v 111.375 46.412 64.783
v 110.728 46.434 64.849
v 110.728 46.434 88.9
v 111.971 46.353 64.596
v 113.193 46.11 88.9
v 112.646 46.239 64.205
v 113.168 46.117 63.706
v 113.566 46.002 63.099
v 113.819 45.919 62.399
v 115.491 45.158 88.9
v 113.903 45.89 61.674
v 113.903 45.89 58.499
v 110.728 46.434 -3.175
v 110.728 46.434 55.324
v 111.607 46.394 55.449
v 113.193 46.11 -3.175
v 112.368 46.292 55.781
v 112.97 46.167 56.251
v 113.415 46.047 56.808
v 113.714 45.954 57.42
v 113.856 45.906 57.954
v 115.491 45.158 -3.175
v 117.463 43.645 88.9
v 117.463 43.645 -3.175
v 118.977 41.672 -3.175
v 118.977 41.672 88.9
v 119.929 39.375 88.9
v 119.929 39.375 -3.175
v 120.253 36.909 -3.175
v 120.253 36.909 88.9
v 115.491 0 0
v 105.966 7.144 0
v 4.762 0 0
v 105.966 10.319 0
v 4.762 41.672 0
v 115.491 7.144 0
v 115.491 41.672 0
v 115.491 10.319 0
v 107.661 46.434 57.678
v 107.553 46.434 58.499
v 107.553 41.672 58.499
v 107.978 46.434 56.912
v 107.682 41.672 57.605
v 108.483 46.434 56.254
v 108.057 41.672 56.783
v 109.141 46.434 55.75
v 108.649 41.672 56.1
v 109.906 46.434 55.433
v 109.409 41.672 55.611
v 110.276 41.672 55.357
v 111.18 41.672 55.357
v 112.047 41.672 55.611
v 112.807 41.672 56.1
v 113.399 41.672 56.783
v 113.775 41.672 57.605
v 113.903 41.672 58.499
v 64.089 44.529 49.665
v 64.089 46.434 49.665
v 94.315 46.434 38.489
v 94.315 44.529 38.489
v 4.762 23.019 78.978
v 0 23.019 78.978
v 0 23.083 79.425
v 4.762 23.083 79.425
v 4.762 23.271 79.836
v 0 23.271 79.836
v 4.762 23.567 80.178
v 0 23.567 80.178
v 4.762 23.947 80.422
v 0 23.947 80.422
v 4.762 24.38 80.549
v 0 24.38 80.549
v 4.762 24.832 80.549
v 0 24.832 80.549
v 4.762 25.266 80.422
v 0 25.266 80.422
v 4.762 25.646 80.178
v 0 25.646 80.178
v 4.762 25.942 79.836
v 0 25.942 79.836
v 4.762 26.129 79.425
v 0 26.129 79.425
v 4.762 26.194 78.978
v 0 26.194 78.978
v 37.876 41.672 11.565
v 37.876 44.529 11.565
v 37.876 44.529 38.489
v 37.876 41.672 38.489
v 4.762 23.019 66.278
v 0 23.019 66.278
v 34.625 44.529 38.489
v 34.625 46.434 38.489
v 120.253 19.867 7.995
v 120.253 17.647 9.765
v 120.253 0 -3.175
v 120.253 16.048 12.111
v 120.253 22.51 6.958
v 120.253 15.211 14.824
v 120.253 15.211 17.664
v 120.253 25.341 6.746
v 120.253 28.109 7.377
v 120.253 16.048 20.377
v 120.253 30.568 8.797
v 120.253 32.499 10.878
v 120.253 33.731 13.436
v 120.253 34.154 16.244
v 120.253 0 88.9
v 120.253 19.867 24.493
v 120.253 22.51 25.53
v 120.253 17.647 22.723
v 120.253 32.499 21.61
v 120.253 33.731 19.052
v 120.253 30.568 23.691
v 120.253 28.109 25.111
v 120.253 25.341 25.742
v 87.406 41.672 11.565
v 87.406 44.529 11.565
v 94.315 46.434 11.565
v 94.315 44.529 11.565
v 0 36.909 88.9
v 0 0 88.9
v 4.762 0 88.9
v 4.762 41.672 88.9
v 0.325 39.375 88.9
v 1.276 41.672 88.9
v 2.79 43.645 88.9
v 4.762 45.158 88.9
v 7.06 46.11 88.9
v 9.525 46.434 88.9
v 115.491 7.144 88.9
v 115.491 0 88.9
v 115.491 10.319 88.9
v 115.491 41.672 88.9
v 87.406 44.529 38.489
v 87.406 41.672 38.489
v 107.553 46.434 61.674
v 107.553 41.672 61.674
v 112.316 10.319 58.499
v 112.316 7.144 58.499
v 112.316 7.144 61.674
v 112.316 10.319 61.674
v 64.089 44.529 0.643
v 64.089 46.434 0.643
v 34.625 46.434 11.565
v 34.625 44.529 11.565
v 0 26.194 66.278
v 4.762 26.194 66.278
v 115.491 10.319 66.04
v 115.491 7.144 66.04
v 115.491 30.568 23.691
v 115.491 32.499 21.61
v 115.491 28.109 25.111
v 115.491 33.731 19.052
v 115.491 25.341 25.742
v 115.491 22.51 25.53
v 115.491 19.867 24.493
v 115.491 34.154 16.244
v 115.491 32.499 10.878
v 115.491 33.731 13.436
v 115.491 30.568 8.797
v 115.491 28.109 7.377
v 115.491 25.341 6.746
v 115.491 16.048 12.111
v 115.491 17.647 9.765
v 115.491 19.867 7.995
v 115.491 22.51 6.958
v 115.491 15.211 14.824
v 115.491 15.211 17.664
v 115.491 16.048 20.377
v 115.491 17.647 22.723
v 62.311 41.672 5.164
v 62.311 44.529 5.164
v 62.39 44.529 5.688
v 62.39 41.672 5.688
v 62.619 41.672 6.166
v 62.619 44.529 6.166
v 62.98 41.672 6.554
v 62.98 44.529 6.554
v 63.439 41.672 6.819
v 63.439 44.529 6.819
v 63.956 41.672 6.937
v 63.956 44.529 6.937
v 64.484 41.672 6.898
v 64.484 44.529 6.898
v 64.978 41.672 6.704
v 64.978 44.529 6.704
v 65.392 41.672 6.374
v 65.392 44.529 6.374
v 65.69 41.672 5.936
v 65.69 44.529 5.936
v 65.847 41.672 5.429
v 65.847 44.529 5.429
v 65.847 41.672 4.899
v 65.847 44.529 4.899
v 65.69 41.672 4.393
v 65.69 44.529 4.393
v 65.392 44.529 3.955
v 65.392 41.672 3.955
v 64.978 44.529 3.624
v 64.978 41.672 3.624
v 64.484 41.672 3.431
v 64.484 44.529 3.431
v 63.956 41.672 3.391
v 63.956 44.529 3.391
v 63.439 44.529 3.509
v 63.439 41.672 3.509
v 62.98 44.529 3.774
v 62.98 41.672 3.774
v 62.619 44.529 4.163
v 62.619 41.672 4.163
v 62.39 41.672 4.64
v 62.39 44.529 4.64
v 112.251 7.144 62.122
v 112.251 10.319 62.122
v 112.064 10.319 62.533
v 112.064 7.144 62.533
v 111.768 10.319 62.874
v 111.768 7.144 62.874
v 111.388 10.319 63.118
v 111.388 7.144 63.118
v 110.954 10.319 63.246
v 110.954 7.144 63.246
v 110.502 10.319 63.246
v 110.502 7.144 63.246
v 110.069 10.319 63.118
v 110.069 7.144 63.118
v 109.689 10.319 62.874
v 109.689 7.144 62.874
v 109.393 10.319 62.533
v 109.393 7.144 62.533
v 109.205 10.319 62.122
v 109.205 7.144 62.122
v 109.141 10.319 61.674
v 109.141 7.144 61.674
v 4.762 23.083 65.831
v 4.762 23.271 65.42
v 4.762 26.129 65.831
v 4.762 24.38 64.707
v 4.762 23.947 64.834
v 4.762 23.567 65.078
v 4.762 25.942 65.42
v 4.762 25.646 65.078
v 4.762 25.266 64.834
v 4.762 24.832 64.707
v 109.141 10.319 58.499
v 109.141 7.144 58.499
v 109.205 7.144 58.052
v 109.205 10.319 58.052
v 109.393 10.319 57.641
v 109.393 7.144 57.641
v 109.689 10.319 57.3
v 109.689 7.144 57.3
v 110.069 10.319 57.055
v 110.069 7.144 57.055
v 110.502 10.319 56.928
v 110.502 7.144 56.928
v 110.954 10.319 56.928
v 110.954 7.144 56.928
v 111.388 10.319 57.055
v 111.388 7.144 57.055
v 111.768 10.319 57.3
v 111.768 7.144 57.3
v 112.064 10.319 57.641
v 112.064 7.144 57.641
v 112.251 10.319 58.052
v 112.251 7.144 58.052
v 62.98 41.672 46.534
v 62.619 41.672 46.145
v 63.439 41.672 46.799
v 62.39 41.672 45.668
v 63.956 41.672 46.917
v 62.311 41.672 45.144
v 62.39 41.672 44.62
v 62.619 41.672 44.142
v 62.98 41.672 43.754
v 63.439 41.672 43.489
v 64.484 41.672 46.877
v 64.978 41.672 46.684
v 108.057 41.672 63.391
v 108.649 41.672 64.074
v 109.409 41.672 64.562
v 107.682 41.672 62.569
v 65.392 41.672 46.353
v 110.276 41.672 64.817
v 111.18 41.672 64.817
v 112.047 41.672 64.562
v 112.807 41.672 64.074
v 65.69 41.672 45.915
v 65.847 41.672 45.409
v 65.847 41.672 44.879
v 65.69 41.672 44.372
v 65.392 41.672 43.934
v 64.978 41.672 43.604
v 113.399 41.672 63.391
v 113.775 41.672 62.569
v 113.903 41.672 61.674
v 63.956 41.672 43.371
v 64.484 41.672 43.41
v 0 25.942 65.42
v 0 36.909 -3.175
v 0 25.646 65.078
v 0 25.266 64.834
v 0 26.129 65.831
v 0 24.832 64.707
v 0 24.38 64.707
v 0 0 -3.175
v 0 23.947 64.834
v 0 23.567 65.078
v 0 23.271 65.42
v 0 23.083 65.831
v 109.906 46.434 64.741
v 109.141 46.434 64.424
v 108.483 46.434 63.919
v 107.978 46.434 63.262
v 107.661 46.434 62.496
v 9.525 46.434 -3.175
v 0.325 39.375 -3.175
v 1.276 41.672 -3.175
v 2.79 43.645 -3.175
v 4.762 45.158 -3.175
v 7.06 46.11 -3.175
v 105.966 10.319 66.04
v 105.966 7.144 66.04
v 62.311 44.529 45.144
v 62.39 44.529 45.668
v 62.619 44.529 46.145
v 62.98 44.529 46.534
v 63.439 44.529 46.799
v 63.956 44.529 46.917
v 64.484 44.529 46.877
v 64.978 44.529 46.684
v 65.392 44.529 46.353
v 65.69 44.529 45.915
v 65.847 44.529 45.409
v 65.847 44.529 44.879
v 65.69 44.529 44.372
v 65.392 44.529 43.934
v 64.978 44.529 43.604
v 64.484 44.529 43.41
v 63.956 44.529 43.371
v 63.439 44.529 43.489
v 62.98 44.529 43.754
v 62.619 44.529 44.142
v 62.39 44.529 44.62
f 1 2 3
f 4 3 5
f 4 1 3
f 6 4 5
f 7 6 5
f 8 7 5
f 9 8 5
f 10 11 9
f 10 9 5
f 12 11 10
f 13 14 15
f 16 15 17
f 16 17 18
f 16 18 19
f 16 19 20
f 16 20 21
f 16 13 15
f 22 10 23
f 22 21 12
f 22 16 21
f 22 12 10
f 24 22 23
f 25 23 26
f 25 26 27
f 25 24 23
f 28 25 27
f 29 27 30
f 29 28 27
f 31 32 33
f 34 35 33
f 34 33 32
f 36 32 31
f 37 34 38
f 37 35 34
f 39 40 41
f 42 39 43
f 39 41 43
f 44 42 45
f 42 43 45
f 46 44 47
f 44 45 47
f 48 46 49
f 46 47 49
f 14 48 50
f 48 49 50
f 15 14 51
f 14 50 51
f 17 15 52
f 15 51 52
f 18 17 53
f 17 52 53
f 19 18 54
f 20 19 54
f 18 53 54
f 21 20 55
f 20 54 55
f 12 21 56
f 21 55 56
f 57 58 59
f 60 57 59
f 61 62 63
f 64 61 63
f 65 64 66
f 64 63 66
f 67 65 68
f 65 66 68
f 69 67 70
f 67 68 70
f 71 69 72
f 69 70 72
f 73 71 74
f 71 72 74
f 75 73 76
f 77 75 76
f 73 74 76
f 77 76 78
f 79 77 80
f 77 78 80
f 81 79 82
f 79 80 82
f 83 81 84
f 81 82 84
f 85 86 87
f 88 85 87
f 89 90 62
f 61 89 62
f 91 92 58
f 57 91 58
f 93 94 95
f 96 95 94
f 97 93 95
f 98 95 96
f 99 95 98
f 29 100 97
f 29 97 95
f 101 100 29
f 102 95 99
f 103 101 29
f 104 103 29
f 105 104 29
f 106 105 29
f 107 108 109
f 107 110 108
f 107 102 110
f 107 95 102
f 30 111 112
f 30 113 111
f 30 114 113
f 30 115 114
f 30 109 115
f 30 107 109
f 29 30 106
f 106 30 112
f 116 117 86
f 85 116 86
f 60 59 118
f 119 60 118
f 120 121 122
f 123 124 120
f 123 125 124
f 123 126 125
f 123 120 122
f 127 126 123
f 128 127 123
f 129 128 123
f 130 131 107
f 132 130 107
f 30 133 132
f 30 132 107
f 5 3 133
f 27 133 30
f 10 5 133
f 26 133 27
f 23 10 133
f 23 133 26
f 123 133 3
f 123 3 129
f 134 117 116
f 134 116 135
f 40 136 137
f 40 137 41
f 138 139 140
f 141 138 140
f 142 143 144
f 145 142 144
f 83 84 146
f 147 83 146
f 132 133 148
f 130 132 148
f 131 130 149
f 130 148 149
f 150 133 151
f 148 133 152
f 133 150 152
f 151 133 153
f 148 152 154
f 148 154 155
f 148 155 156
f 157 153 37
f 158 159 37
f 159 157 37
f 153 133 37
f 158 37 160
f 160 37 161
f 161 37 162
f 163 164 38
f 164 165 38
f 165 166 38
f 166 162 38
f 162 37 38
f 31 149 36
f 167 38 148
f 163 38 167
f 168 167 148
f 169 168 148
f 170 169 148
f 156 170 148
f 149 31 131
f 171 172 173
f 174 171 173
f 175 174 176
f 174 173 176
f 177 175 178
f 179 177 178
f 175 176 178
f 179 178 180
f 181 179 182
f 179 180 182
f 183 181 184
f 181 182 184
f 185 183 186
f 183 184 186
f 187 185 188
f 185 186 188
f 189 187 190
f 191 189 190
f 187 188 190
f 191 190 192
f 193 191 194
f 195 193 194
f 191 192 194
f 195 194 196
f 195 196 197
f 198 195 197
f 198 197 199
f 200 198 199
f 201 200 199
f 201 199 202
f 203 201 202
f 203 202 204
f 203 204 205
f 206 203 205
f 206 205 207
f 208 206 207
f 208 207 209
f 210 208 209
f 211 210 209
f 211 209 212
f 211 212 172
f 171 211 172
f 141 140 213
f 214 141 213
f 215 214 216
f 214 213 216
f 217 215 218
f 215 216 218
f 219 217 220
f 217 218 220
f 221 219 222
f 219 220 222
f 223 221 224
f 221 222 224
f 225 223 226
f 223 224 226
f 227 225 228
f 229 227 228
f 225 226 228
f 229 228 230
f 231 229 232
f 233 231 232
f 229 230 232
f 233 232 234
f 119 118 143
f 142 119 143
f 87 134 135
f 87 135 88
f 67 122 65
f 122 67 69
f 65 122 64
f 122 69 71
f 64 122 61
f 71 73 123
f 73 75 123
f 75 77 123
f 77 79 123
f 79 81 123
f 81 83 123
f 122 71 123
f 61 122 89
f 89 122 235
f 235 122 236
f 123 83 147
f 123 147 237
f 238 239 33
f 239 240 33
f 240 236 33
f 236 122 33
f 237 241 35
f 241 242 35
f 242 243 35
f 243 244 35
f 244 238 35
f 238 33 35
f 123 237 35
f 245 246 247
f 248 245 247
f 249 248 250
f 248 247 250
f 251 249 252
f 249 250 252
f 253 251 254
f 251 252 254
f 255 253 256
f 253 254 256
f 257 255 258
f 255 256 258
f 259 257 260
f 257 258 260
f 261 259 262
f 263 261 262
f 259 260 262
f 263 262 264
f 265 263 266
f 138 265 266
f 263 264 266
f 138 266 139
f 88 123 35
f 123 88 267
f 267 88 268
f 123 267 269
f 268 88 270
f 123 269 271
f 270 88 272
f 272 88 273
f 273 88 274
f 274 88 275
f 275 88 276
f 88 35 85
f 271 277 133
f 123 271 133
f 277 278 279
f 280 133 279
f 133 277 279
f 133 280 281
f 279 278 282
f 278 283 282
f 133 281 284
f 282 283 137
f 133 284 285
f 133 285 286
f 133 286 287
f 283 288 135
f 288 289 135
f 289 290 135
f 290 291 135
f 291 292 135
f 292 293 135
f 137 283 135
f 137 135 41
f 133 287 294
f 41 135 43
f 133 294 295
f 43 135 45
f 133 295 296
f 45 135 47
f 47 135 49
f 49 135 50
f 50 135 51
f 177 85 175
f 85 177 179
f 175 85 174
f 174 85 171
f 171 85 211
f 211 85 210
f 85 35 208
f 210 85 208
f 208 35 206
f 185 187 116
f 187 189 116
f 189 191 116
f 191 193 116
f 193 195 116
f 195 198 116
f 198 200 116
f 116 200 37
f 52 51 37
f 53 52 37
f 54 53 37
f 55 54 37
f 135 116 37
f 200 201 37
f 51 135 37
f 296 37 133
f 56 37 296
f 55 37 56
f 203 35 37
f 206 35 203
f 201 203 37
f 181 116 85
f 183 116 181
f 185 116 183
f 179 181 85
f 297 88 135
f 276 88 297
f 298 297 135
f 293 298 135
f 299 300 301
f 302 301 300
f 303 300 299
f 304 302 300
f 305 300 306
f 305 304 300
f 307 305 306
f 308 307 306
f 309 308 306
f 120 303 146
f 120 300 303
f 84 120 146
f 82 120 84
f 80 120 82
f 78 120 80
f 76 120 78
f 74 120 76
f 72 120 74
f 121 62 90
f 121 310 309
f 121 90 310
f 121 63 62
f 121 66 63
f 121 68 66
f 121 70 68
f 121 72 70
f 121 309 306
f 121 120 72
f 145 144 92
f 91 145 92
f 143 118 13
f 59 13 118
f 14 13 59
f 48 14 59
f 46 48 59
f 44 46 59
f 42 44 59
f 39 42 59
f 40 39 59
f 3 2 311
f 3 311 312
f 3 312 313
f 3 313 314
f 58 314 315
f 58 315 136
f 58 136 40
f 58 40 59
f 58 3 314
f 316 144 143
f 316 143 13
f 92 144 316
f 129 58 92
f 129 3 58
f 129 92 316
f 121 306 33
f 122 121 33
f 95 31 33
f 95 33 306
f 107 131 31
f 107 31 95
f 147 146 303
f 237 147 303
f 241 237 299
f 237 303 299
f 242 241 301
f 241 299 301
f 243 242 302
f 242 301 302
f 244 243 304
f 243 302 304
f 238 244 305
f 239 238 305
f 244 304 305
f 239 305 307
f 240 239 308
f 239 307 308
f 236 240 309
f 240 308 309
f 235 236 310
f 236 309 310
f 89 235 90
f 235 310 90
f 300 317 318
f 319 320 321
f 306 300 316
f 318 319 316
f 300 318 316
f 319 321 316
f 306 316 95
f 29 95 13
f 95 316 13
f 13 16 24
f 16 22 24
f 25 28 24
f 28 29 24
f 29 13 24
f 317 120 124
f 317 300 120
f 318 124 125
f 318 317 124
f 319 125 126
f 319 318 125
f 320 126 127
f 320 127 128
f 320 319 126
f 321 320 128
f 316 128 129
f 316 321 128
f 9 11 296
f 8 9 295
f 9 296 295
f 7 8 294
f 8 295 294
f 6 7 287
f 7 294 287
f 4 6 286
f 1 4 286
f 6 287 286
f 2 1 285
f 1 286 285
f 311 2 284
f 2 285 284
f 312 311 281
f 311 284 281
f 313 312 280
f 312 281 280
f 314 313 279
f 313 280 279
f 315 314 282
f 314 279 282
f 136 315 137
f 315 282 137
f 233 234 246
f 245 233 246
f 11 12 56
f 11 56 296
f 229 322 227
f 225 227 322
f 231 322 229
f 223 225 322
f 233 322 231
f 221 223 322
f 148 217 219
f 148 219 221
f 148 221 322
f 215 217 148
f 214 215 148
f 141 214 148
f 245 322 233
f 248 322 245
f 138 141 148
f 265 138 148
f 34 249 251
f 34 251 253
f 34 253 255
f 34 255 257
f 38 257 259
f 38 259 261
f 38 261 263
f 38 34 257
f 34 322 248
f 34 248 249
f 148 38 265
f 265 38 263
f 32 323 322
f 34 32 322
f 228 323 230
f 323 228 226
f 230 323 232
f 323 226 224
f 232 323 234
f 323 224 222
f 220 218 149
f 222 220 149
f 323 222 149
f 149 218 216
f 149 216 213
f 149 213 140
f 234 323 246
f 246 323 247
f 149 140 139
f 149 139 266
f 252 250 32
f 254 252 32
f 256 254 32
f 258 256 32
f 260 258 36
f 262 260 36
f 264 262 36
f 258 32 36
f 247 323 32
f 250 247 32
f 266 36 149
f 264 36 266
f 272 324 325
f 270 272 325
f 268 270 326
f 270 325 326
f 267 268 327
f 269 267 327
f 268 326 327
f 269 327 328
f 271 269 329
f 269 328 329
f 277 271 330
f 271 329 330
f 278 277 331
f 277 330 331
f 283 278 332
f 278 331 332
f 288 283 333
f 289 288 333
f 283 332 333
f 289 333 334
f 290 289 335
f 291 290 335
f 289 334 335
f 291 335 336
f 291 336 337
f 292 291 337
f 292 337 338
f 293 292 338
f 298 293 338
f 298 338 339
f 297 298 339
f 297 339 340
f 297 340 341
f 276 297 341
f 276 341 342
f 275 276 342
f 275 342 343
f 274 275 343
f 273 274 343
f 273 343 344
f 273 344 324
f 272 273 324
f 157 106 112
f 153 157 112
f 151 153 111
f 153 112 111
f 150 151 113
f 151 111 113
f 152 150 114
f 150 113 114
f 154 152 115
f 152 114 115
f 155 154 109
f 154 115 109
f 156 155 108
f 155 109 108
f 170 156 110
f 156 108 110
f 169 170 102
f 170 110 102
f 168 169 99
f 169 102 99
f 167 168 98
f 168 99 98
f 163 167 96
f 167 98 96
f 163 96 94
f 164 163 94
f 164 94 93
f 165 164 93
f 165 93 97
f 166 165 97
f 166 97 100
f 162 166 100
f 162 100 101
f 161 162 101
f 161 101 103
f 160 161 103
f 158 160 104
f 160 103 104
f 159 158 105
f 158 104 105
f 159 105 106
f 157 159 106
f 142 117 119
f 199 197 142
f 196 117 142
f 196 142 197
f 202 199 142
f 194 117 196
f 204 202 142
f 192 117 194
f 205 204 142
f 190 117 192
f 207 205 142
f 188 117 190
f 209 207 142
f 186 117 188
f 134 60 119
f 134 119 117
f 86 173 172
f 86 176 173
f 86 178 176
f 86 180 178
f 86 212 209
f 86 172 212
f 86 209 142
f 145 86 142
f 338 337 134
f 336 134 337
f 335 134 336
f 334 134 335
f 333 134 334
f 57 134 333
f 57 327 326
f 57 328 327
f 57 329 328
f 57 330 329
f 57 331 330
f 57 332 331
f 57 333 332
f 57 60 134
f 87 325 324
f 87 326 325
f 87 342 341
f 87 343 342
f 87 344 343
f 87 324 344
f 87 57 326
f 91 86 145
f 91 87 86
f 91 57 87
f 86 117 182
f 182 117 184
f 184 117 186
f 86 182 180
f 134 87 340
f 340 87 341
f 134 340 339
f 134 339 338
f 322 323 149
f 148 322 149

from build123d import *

# Parameters (mm, degrees)
F1_DEPTH  = 88.9
F0_W      = 110.728125
F0_H      = 41.671875
F2_DEPTH  = 3.175
F3_W      = 9.525
F3_H      = 3.175
F4_DEPTH  = 88.9
F5_W      = 9.525
F5_H      = 22.86
F6_DEPTH  = 3.175
F8_DEPTH  = 4.7625
F9_R      = 9.525
F10_W     = 49.53
F10_H     = 26.924
F10_R     = 1.778
F11_DEPTH = 4.7625
F12_DEPTH = 1.905
F14_DEPTH = 4.7625
F15_R     = 9.525
F16_DEPTH = 4.7625


with BuildPart() as f1:
    # F0 (on Top) → F1 (new body)
    with BuildSketch(Plane.XY):
        Polygon((0, 46.434375), (0, 0), (4.7625, 0), (4.7625, 41.671875), (115.490625, 41.671875), (115.490625, 0), (120.253125, 0), (120.253125, 46.434375), align=None)
    extrude(amount=F1_DEPTH)

    # F0 (on Top) → F2 (join)
    with BuildSketch(Plane.XY):
        Polygon((0, 46.434375), (0, 0), (4.7625, 0), (4.7625, 41.671875), (115.490625, 41.671875), (115.490625, 0), (120.253125, 0), (120.253125, 46.434375), align=None)
        with Locations((60.1265625, 20.8359375)):
            Rectangle(F0_W, F0_H)
    extrude(amount=-F2_DEPTH)

    # F3 (on face) → F4 (join, through all)
    with BuildSketch(Plane.XY):
        with Locations((110.728125, 8.73125)):
            Rectangle(F3_W, F3_H)
    extrude(amount=F4_DEPTH)

    # F5 (on face) → F6 (cut, through all)
    with BuildSketch(Plane.XZ.offset(-7.14375)):
        with Locations((110.728125, 77.4700000001)):
            Rectangle(F5_W, F5_H)
        with BuildLine():
            Line((112.315625, 58.4993750001), (112.315625, 61.6743750001))
            ThreePointArc((112.315625, 61.6743750001), (110.728125, 63.2618750001), (109.140625, 61.6743750001))
            Line((109.140625, 61.6743750001), (109.140625, 58.4993750001))
            ThreePointArc((109.140625, 58.4993750001), (110.728125, 56.9118750001), (112.315625, 58.4993750001))
        make_face()
    extrude(amount=-F6_DEPTH, mode=Mode.SUBTRACT)

    # F7 (on face) → F8 (cut, through all)
    with BuildSketch(Plane(origin=(0, 0, 0), x_dir=(0, -1, 0), z_dir=(-1, 0, 0))):
        with BuildLine():
            Line((-23.01875, 66.278125), (-23.01875, 78.978125))
            ThreePointArc((-23.01875, 78.978125), (-24.60625, 80.565625), (-26.19375, 78.978125))
            Line((-26.19375, 78.978125), (-26.19375, 66.278125))
            ThreePointArc((-26.19375, 66.278125), (-24.60625, 64.690625), (-23.01875, 66.278125))
        make_face()
    extrude(amount=-F8_DEPTH, mode=Mode.SUBTRACT)

    # F9
    f9_edges = [f1.edges().sort_by_distance(p)[0] for p in [
        (120.253125, 46.434375, 42.8625),
        (0, 46.434375, 42.8625),
    ]]
    fillet(f9_edges, radius=F9_R)

    # F10 (on face) → F11 (cut, through all)
    with BuildSketch(Plane(origin=(0, 46.434375, 0), x_dir=(-1, 0, 0), z_dir=(0, 1, 0))):
        with Locations((-62.6407308385, 25.0270083303)):
            Rectangle(F10_W, F10_H)
        with Locations((-64.0885308385, 45.1438083303)):
            Circle(F10_R)
        with Locations((-64.0885308385, 5.1642083303)):
            Circle(F10_R)
    extrude(amount=-F11_DEPTH, mode=Mode.SUBTRACT)

    # F10 (on face) → F12 (cut)
    with BuildSketch(Plane(origin=(0, 46.434375, 0), x_dir=(-1, 0, 0), z_dir=(0, 1, 0))):
        Polygon((-94.3145308385, 38.4890083303), (-94.3145308385, 11.5650083303), (-64.0885308385, 0.6430083303), (-34.6245308385, 11.5650083303), (-34.6245308385, 38.4890083303), (-64.0885308385, 49.6650083303), align=None)
        with Locations((-64.0885308385, 5.1642083303)):
            Circle(F10_R, mode=Mode.SUBTRACT)
        with Locations((-62.6407308385, 25.0270083303)):
            Rectangle(F10_W, F10_H, mode=Mode.SUBTRACT)
        with Locations((-64.0885308385, 45.1438083303)):
            Circle(F10_R, mode=Mode.SUBTRACT)
    extrude(amount=-F12_DEPTH, mode=Mode.SUBTRACT)

    # F13 (on face) → F14 (cut, through all)
    with BuildSketch(Plane.XZ.offset(-41.671875)):
        with BuildLine():
            Line((113.903125, 58.4993750001), (113.903125, 61.6743750001))
            ThreePointArc((113.903125, 61.6743750001), (110.728125, 64.8493750001), (107.553125, 61.6743750001))
            Line((107.553125, 61.6743750001), (107.553125, 58.4993750001))
            ThreePointArc((107.553125, 58.4993750001), (110.728125, 55.3243750001), (113.903125, 58.4993750001))
        make_face()
    extrude(amount=-F14_DEPTH, mode=Mode.SUBTRACT)

    # F15 (on face) → F16 (cut, through all)
    with BuildSketch(Plane.YZ.offset(120.253125)):
        with Locations((24.6292781085, 16.2439811975)):
            Circle(F15_R)
    extrude(amount=-F16_DEPTH, mode=Mode.SUBTRACT)


solid = f1.part
